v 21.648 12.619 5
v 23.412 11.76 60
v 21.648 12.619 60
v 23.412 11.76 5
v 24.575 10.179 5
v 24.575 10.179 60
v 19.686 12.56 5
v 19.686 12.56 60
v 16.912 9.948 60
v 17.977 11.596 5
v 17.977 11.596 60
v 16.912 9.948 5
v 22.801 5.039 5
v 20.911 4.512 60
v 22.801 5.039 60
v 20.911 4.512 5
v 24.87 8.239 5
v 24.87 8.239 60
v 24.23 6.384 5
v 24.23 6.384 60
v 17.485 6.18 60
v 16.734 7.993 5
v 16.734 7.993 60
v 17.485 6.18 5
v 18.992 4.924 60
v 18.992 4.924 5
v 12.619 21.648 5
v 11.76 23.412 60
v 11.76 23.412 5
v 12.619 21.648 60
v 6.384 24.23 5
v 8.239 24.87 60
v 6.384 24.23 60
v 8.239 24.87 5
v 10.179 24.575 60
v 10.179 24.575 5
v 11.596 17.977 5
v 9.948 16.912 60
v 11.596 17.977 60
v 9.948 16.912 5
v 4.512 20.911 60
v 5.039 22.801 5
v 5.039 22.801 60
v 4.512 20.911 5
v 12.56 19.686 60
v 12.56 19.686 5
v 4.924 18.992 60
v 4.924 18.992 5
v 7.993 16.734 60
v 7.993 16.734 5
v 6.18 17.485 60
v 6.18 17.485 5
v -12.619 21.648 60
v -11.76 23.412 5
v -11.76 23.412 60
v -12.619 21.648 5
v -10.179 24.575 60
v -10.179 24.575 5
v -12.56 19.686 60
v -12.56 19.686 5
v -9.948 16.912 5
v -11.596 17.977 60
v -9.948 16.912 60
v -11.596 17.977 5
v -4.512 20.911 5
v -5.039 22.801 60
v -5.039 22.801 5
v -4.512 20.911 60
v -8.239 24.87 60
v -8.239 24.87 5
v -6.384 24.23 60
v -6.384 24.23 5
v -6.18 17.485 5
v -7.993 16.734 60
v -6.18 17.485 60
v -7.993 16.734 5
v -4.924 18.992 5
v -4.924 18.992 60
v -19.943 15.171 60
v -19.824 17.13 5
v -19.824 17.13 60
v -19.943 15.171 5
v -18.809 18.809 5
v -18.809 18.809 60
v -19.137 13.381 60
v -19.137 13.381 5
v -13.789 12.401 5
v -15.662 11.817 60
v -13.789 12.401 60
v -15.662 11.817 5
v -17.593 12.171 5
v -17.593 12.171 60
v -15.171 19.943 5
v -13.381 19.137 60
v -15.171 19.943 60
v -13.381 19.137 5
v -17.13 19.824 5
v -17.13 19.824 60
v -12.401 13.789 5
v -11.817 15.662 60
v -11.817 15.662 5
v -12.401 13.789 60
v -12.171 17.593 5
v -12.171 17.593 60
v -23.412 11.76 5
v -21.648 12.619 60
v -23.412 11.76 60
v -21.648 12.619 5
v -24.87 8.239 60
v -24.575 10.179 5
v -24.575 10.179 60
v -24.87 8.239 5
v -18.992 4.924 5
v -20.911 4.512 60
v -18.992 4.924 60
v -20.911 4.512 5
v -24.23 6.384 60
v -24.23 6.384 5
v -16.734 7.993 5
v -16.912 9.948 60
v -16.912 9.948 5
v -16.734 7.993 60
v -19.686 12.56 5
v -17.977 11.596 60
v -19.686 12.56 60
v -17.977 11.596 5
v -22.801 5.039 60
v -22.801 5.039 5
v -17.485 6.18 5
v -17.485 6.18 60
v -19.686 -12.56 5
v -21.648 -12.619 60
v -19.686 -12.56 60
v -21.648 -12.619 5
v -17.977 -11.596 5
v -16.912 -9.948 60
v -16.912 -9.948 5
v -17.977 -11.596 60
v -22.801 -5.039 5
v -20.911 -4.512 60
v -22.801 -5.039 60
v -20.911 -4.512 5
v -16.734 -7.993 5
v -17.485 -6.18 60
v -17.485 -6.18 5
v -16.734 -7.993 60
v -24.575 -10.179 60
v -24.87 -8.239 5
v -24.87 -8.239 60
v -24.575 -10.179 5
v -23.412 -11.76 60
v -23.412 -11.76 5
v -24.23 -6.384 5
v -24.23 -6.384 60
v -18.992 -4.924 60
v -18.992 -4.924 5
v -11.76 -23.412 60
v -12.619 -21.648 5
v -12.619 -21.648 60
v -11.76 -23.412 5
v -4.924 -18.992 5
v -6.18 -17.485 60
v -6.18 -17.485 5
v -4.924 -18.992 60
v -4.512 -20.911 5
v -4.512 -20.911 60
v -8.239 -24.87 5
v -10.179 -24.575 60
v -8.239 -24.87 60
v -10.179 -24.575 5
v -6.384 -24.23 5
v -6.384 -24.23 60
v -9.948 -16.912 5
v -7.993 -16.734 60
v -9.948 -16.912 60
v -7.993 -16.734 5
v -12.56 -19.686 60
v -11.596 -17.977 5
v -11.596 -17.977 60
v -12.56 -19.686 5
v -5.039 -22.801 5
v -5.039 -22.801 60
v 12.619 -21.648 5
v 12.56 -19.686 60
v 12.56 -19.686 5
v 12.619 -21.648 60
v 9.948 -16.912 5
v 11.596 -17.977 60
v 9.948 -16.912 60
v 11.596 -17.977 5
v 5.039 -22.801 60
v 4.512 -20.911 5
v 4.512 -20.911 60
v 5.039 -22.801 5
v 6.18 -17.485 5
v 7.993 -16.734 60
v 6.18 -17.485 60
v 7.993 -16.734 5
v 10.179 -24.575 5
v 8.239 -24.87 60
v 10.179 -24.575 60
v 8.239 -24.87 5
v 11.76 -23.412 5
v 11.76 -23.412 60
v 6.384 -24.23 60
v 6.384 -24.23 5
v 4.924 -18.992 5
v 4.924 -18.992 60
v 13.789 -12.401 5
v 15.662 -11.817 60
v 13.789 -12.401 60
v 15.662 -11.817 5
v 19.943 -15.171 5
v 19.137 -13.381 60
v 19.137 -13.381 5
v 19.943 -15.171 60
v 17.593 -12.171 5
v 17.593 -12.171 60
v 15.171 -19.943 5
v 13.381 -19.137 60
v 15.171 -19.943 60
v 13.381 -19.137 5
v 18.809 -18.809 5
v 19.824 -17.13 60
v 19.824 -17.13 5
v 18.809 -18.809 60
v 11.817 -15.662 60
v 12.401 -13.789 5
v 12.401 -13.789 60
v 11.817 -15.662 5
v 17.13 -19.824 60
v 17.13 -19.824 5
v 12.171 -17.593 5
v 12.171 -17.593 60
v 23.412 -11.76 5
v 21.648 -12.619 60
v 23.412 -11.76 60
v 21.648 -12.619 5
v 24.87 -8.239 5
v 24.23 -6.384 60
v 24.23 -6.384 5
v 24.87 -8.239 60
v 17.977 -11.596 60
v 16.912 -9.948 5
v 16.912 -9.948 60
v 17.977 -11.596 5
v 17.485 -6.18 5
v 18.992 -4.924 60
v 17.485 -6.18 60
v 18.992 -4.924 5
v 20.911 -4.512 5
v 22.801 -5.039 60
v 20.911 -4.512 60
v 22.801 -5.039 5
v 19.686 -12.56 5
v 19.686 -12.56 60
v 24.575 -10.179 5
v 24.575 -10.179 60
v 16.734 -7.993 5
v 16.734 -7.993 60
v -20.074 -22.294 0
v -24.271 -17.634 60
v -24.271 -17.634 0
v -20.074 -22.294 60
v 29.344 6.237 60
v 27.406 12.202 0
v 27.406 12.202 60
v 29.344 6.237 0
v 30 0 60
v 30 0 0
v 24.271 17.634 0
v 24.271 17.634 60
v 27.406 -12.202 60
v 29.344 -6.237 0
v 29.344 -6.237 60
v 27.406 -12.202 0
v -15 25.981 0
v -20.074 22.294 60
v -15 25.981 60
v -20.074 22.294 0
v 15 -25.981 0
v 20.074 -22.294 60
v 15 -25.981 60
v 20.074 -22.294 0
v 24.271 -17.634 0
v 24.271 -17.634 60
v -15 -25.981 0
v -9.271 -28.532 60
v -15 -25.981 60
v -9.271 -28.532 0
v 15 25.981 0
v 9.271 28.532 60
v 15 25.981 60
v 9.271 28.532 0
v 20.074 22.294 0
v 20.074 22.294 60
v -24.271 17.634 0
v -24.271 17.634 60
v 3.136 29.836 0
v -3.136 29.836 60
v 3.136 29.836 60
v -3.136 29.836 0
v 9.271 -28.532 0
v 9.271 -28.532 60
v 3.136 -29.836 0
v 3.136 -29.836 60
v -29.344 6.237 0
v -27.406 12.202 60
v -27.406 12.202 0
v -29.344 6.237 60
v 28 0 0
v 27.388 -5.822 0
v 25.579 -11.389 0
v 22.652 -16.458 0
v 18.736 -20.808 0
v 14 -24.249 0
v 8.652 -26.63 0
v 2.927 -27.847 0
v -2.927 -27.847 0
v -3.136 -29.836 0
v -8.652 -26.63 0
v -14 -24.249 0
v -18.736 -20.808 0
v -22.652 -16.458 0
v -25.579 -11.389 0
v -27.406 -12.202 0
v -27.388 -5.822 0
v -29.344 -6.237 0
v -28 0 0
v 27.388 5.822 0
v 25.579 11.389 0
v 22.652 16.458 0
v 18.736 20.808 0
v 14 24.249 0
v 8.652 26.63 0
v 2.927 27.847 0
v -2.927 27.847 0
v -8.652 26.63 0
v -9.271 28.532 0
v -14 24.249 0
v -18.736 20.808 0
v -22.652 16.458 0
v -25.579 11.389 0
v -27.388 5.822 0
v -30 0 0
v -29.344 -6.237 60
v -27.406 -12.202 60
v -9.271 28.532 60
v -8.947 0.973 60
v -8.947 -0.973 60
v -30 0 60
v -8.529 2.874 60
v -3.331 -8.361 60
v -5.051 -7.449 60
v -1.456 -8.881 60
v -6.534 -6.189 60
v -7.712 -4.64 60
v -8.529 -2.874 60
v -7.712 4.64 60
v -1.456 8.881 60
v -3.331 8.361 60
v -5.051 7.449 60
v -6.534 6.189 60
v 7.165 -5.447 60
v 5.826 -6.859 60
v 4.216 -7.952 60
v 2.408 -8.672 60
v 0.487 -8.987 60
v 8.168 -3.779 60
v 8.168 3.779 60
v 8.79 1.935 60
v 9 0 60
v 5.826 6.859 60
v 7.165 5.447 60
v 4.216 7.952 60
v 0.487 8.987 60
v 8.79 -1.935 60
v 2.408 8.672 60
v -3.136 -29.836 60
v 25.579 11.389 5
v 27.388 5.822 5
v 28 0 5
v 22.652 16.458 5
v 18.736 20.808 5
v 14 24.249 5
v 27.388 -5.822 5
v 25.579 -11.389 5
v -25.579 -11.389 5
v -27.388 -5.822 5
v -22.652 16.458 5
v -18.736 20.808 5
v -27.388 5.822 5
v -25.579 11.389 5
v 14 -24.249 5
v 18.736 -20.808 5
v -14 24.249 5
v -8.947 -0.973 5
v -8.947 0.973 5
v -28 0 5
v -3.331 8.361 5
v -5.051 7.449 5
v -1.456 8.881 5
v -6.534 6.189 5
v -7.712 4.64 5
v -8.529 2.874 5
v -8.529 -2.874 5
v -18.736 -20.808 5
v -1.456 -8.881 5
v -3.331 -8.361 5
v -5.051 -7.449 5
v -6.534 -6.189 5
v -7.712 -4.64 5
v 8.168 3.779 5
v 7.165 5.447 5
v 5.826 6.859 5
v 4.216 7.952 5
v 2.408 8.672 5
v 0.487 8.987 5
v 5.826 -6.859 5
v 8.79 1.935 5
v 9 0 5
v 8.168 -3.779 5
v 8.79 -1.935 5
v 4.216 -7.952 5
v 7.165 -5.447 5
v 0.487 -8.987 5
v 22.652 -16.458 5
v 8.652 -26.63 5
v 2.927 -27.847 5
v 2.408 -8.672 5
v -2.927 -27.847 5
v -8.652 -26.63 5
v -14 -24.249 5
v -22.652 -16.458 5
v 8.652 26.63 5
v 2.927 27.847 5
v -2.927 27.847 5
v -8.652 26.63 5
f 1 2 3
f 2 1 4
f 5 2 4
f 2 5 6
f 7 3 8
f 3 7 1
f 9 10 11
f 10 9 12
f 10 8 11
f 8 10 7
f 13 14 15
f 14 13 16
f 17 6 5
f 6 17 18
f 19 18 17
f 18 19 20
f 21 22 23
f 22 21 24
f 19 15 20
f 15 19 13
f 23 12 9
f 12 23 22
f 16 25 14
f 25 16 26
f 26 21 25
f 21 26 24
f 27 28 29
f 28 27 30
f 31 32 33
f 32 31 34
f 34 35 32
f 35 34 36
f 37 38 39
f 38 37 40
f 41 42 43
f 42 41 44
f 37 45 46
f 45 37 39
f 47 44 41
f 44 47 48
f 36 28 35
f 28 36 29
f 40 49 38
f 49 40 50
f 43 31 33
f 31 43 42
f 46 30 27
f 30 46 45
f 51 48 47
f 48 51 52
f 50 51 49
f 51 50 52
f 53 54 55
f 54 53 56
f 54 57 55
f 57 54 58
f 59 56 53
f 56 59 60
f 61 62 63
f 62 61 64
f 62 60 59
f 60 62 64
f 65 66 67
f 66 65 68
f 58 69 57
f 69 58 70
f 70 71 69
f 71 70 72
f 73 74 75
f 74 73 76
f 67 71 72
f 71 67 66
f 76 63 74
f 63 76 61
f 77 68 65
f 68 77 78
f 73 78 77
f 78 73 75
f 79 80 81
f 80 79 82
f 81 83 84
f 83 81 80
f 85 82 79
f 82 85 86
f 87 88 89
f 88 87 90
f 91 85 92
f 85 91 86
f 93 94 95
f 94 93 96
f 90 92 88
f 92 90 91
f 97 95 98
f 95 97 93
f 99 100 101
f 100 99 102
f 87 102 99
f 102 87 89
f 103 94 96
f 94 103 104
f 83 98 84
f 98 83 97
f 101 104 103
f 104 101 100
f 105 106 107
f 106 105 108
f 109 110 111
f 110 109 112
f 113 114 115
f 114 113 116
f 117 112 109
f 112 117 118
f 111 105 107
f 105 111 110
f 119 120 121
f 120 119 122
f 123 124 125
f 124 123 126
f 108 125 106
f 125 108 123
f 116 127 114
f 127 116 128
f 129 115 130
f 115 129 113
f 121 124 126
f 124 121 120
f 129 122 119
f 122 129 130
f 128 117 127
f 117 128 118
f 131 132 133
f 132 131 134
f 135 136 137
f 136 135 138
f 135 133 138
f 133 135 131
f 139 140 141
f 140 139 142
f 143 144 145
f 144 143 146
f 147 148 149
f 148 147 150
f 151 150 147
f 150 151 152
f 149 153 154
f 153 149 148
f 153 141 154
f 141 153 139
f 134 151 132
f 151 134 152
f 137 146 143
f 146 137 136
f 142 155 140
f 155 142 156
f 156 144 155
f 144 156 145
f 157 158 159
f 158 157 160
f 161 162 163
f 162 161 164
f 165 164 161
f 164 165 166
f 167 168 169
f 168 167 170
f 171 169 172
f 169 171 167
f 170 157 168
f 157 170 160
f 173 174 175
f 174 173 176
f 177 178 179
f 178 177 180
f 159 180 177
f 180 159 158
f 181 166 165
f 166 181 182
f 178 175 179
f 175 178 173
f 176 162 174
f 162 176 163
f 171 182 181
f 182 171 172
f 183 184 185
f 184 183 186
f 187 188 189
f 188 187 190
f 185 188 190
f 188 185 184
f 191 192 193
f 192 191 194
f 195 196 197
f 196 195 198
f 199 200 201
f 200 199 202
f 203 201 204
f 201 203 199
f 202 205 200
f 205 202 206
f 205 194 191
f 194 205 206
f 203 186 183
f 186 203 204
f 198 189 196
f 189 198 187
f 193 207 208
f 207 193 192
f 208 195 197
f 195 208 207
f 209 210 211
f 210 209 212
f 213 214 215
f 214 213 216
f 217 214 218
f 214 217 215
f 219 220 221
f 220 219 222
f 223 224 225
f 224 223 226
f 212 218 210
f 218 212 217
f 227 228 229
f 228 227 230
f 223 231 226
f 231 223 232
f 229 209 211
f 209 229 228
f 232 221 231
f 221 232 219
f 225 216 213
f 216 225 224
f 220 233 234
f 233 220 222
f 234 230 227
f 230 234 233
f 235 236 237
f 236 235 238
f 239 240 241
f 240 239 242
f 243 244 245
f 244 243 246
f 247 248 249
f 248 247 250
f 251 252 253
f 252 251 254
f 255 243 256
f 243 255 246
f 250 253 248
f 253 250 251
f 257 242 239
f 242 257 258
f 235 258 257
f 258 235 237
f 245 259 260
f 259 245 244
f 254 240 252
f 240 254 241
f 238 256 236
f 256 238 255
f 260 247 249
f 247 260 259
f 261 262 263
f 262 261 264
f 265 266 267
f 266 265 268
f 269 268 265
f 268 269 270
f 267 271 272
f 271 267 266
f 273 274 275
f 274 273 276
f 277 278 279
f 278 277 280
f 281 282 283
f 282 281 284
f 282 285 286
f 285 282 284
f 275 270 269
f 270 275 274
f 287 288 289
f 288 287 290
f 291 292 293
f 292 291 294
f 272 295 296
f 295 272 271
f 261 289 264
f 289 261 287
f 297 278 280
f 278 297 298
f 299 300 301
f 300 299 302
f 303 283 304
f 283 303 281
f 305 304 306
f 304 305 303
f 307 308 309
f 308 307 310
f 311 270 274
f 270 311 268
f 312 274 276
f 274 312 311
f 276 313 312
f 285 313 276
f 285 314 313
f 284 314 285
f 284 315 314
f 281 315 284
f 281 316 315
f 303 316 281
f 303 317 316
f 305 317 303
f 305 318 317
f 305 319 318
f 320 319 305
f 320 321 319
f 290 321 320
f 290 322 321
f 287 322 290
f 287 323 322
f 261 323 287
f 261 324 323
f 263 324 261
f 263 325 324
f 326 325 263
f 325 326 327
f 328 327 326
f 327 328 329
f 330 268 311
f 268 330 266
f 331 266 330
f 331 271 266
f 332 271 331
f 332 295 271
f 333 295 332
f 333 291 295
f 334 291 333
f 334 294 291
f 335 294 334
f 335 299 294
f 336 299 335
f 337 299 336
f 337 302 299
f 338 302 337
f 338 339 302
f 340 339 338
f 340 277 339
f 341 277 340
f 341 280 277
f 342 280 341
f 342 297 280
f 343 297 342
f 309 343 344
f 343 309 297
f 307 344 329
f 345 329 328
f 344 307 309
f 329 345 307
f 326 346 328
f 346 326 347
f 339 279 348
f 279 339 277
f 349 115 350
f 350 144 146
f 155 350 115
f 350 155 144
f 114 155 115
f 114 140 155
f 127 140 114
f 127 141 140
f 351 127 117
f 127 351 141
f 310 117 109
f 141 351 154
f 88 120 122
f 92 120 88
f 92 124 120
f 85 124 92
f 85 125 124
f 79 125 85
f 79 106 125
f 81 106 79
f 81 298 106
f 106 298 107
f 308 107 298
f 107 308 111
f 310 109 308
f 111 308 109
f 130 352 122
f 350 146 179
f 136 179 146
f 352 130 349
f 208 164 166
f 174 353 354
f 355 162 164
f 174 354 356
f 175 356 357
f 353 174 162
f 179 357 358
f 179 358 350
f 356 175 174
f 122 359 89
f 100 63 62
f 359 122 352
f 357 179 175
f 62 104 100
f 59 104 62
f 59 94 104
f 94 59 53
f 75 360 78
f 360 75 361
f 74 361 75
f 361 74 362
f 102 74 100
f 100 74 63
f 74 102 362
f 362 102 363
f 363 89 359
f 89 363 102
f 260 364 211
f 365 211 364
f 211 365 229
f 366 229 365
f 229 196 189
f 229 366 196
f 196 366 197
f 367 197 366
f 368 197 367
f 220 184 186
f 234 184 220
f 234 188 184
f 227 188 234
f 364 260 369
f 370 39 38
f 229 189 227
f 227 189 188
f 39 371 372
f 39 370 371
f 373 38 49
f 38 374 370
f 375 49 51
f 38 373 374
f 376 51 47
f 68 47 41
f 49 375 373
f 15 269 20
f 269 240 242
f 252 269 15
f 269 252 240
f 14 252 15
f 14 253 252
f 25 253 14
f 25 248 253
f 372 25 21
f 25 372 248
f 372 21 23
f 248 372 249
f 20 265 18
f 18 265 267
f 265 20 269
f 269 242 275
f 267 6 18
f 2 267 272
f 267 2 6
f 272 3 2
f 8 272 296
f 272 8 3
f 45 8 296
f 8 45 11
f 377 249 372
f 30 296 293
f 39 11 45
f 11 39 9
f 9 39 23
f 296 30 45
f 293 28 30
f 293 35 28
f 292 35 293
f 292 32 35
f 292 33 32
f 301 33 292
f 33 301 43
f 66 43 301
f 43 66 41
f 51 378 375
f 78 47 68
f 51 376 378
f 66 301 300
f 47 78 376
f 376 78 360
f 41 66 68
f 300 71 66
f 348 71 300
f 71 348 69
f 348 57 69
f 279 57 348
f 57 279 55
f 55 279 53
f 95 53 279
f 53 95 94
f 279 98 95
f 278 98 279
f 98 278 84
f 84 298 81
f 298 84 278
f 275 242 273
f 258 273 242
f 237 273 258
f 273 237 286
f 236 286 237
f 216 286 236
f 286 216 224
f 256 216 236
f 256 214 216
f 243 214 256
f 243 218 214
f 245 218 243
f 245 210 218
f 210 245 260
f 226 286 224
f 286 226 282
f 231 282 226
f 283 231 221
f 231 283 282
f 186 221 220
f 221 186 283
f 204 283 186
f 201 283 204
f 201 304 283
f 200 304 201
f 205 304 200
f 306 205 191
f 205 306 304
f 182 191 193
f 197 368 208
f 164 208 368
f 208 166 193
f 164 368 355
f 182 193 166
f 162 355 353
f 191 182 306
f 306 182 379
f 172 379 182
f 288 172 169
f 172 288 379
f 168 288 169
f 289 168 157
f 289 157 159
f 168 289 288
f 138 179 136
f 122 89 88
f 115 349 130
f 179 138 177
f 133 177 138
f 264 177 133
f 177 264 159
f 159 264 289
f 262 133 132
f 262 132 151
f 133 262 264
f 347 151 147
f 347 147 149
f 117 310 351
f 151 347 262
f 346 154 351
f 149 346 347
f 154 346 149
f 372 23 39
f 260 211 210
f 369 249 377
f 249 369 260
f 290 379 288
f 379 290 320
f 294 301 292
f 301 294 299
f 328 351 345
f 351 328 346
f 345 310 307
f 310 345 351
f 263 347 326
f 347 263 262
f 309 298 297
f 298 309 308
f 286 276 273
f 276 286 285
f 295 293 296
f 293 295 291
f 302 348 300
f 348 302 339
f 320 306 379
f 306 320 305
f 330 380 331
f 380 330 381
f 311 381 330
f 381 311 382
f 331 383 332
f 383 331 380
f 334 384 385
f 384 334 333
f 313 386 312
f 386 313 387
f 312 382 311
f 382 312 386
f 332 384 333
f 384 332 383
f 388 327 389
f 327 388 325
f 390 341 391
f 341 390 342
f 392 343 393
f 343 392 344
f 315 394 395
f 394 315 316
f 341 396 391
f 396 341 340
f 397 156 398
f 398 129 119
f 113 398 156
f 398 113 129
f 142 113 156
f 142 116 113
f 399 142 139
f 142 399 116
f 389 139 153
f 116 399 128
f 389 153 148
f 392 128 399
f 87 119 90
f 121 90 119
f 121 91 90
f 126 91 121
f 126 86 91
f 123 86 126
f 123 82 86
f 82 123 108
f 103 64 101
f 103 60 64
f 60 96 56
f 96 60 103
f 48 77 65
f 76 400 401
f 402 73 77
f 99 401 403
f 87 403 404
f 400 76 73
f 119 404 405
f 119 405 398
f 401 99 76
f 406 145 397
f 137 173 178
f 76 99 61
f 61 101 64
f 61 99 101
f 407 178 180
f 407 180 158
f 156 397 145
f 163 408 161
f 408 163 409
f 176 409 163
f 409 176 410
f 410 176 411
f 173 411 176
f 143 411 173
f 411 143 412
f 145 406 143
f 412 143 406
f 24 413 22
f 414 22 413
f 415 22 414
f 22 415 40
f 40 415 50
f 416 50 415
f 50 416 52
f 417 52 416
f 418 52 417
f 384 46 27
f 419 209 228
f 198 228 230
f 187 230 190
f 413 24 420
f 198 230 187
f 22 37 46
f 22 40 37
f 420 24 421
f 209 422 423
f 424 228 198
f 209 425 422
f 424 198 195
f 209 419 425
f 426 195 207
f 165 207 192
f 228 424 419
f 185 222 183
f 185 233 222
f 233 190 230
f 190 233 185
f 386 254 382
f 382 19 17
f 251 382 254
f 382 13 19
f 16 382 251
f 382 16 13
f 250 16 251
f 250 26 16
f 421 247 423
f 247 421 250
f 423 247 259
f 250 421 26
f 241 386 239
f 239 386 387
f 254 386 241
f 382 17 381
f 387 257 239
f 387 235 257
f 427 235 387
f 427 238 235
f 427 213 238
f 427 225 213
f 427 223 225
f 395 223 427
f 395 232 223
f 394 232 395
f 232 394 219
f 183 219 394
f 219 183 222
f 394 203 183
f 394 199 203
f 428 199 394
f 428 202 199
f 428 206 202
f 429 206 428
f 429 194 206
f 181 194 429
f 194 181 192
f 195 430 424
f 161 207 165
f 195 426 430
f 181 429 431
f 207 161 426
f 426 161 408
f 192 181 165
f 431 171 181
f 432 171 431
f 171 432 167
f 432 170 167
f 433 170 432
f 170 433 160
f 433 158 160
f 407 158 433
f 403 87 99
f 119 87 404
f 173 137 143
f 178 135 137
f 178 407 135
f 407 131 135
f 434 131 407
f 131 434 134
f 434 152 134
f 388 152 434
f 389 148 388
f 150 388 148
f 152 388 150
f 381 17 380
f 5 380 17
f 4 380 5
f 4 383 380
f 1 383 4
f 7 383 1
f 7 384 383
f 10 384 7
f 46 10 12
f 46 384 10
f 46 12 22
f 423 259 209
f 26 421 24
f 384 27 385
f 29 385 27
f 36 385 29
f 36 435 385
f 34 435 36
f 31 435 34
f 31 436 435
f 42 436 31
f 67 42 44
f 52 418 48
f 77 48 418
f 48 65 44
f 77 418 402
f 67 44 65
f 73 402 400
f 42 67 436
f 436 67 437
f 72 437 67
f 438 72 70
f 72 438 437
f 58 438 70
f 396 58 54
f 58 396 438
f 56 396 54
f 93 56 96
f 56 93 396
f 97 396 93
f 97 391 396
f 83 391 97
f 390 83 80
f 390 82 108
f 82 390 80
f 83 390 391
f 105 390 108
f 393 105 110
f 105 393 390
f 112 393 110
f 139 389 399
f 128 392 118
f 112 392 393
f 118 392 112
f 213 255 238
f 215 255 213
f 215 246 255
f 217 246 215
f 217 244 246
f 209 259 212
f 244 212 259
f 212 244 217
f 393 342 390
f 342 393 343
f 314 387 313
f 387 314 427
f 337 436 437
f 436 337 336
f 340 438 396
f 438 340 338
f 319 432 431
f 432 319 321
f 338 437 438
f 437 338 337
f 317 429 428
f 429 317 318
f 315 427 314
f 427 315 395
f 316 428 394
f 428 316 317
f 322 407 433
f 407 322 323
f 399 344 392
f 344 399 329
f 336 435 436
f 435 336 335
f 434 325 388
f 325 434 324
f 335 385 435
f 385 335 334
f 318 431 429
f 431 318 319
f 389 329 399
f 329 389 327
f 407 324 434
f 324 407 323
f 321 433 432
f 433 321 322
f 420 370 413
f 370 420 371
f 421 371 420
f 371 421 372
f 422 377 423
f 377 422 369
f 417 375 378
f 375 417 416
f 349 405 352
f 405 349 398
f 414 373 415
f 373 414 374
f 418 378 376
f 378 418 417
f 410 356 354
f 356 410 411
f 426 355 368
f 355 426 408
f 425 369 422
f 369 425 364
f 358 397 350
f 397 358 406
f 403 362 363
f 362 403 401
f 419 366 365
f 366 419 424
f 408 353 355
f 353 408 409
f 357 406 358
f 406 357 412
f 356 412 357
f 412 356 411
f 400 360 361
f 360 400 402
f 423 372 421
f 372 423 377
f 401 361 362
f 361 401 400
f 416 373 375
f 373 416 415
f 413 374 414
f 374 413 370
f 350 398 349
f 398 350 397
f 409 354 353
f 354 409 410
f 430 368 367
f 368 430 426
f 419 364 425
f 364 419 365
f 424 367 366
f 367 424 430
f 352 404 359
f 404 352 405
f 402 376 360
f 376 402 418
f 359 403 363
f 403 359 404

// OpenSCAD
difference () {
    //Zylinderkopf Grundkörper
    cylinder (r=30, h=60);
    
    //Arretierungsflansch für Schneckenzylinder
    cylinder (r=28, h=5);
    
    //Mittelloch für Schnecke
    cylinder (r=9, h=62);
    
    // Bohrungen für M8 Schraube
    for (a=[1,3,5,6,7,9,11,13,14,15]) {
        rotate([0,0,a*22.5]) {
            translate ([45/2,0,0]) {
                cylinder (r=4.1, h=62);
            }
        }
    }   
}
